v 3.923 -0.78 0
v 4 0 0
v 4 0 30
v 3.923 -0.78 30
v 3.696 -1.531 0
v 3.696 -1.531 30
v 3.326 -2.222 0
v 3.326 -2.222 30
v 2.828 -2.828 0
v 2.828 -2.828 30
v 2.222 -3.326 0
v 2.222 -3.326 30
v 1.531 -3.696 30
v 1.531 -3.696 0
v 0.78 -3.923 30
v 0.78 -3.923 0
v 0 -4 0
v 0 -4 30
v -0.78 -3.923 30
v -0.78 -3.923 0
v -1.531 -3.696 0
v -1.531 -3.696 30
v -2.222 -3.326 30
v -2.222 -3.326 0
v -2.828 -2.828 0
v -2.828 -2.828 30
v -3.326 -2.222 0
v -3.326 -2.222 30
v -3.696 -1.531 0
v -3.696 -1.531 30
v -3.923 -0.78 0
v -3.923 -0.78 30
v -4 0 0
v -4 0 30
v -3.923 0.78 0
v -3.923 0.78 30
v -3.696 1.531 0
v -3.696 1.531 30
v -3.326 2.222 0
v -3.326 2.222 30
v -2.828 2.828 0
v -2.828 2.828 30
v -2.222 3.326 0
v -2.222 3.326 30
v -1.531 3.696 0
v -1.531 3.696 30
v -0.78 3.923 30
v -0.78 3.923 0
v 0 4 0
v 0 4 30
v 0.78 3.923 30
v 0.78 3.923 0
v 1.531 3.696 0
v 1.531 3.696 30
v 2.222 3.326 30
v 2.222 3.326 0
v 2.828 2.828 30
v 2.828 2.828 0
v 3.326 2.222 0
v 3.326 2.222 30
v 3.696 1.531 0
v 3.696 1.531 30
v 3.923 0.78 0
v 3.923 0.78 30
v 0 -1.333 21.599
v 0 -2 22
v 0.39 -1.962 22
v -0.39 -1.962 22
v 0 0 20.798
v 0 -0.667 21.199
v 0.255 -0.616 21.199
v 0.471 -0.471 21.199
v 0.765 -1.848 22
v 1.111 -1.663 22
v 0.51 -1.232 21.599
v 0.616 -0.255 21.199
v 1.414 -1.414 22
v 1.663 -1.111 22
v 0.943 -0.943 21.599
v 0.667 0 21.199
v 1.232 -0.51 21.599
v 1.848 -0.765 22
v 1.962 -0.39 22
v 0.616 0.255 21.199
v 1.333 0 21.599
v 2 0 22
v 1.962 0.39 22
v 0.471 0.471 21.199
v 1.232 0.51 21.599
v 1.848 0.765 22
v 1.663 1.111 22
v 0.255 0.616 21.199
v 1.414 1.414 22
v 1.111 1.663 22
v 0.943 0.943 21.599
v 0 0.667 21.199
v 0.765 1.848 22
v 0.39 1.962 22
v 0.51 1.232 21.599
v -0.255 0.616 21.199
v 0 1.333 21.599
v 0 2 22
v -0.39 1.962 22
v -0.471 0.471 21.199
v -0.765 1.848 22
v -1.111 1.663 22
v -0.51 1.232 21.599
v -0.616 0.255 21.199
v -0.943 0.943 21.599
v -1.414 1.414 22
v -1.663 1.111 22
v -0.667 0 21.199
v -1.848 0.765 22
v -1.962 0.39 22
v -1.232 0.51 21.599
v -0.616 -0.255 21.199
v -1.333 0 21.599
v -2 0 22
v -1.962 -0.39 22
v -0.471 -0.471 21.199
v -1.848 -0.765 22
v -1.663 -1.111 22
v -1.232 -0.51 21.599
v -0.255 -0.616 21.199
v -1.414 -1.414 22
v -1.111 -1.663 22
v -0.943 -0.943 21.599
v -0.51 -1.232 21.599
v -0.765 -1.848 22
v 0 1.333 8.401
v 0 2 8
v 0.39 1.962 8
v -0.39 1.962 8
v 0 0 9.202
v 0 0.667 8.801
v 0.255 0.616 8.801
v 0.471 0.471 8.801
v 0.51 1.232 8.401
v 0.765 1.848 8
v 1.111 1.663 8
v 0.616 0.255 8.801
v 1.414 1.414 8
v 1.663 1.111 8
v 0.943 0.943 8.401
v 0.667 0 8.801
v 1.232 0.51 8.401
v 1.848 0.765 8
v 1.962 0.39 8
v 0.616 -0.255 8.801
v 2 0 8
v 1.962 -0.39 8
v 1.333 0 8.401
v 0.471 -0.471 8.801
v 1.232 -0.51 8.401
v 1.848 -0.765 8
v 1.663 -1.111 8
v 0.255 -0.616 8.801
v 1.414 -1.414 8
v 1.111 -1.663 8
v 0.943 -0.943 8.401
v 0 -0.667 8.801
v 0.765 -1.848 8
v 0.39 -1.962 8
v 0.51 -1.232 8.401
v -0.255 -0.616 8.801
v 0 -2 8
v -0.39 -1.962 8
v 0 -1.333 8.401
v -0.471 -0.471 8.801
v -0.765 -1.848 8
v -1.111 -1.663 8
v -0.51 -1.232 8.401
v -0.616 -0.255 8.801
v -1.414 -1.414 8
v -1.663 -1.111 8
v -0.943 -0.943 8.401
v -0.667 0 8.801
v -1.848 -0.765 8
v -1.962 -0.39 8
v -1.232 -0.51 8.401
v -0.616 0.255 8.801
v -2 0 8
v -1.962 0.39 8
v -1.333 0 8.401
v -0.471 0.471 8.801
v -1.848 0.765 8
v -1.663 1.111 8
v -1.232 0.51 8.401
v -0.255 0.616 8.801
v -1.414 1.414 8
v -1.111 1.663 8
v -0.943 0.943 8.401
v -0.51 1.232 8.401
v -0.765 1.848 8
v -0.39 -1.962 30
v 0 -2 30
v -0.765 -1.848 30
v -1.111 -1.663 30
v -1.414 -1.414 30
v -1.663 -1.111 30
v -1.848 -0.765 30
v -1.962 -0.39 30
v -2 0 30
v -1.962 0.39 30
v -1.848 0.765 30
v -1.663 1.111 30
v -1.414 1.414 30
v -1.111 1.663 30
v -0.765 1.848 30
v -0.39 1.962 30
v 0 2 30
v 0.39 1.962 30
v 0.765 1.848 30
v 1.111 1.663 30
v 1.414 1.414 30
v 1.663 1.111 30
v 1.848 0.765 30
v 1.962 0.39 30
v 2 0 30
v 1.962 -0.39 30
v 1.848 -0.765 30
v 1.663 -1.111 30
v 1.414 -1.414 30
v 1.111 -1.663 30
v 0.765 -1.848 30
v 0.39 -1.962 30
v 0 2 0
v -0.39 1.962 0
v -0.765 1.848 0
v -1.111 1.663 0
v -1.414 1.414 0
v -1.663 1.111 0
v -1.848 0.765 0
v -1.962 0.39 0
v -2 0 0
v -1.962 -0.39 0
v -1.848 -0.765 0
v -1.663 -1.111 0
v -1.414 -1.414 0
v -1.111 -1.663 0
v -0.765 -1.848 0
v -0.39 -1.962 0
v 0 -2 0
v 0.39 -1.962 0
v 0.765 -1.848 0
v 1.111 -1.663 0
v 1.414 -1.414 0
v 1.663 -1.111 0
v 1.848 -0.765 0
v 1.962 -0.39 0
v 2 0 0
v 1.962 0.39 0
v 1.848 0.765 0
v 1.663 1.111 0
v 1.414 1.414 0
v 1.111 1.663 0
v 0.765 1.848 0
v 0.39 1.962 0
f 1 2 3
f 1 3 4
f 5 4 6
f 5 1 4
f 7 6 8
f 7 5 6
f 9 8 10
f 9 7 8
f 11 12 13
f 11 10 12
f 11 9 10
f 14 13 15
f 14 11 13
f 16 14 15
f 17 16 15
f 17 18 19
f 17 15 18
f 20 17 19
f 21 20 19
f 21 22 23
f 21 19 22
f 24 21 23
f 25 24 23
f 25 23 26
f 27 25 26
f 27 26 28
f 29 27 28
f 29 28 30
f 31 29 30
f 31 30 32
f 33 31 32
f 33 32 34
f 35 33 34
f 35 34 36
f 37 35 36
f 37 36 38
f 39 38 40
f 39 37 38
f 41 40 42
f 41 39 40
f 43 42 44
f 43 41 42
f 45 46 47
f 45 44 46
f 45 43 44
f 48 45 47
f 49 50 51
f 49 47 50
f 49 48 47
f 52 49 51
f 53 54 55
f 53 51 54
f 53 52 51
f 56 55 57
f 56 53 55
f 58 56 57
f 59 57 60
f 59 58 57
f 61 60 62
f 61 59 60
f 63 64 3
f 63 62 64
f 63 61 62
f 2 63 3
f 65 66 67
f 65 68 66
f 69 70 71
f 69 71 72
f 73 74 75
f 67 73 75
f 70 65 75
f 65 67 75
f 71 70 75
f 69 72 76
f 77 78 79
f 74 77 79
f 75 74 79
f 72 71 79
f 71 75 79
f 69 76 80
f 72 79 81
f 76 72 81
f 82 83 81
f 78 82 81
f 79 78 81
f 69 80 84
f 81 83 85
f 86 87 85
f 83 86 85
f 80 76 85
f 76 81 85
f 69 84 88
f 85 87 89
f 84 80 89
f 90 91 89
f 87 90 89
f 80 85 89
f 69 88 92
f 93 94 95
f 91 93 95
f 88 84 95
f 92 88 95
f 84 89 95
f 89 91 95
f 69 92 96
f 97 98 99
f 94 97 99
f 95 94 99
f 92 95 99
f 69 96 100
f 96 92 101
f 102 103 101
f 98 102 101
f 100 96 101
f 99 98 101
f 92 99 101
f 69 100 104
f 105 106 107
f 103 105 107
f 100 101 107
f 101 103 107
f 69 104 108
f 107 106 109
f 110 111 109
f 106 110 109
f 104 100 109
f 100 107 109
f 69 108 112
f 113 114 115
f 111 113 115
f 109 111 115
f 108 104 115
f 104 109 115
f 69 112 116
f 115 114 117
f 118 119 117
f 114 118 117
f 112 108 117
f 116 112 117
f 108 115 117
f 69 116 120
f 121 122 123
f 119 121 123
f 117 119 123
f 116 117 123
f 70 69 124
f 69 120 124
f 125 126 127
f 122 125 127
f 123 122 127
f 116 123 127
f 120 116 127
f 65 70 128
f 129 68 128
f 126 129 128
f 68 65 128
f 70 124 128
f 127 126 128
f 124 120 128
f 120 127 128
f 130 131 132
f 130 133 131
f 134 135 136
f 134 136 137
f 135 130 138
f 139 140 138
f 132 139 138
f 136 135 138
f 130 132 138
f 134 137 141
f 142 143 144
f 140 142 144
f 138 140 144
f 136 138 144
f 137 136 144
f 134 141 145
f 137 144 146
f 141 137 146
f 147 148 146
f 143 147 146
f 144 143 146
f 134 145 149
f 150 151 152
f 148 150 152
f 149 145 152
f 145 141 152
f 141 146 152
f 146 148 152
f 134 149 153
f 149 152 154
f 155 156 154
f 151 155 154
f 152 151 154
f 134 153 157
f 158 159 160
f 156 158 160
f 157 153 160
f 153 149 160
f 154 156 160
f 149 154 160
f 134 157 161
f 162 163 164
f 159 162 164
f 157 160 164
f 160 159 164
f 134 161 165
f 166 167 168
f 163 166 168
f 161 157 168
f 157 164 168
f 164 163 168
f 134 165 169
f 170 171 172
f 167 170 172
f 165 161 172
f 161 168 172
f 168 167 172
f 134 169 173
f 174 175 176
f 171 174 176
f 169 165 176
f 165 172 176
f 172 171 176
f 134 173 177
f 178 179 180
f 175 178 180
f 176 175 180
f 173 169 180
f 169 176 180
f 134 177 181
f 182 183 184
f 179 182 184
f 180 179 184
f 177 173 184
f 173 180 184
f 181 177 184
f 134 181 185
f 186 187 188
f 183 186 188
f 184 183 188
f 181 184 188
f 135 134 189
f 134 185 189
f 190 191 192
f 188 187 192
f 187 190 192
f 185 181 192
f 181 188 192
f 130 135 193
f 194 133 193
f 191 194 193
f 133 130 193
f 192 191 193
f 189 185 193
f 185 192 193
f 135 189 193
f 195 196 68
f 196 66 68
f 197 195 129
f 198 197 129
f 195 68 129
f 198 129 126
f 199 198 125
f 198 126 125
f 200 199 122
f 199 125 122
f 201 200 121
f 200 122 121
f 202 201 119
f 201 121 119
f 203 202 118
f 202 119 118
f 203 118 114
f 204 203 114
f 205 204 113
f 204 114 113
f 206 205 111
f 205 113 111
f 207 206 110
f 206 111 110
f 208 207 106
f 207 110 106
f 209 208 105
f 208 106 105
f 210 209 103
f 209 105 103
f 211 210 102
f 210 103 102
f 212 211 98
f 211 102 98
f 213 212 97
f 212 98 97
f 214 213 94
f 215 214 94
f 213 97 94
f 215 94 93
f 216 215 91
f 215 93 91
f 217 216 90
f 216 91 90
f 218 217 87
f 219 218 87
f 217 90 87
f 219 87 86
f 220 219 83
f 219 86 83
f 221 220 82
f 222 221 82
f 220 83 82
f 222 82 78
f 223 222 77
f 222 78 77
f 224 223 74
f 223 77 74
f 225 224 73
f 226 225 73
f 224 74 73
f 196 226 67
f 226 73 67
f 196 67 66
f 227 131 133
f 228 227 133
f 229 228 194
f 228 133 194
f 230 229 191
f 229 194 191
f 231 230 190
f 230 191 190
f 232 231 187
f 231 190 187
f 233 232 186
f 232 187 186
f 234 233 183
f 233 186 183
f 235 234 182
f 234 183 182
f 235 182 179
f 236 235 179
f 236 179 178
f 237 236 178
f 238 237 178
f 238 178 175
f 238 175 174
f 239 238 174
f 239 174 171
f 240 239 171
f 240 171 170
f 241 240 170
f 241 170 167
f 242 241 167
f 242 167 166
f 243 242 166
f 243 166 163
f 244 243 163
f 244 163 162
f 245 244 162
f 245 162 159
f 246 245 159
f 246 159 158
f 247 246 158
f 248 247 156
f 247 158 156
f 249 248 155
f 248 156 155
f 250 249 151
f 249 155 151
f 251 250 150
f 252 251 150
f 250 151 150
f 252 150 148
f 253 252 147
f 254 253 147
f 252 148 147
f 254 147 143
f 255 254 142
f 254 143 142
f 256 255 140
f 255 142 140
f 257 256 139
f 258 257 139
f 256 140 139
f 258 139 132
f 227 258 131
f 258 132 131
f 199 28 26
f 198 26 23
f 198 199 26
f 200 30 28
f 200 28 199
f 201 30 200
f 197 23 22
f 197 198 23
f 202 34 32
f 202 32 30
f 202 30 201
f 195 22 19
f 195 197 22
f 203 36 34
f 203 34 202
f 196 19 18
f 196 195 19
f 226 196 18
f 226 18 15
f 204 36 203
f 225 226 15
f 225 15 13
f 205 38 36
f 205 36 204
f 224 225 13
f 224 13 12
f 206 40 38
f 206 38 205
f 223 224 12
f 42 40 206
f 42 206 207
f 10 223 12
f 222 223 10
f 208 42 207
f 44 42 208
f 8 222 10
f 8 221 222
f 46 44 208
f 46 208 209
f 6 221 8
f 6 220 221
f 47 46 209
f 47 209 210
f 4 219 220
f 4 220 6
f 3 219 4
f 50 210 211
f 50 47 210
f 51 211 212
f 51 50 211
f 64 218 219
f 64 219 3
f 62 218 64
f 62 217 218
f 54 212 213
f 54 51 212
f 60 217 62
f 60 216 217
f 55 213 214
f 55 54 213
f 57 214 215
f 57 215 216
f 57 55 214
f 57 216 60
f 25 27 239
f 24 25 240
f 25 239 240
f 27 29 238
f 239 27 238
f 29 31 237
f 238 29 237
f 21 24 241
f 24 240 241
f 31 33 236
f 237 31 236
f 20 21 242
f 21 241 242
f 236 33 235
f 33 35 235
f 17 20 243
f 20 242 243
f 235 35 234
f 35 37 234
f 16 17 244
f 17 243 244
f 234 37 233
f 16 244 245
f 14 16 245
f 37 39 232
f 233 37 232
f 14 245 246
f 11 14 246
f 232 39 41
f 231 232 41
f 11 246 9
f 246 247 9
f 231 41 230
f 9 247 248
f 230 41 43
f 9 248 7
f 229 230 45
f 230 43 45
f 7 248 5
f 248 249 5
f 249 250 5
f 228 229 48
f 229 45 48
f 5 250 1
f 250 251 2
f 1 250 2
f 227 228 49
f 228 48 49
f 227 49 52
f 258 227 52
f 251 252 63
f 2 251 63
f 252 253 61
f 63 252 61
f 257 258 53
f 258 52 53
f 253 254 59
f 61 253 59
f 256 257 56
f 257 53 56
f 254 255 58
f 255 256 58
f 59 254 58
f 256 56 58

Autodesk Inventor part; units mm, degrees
ref_plane "YZ Plane" through (0, 0, 0) normal (1, 0, 0) x (0, 1, 0)
ref_plane "XZ Plane" through (0, 0, 0) normal (0, 1, 0) x (-1, 0, 0)
ref_plane "XY Plane" through (0, 0, 0) normal (0, 0, 1) x (1, 0, 0)
sketch "スケッチ1" plane through (0, 0, 0) normal (0, 0, 1) x (1, 0, 0)
  circle A0 centre (0, 0) radius 4
  dimension "d0" = 8
extrude "押し出し1" add sketch "スケッチ1" along normal blind 30
hole "穴1" at (0, 0, 0) direction (0, 0, 1) diameter 4 depth 8 tip angle 118
sketch "スケッチ2" plane through (0, 0, 30) normal (0, 0, 1) x (1, 0, 0)
  point P0 (0, 0)
  point P1 (0, 0)
hole "穴2" at (0, 0, 30) direction (0, 0, -1) diameter 4 depth 8 tip angle 118
properties part number "スペーサ　m4-l30" material "アルミニウム 2014-T4"
